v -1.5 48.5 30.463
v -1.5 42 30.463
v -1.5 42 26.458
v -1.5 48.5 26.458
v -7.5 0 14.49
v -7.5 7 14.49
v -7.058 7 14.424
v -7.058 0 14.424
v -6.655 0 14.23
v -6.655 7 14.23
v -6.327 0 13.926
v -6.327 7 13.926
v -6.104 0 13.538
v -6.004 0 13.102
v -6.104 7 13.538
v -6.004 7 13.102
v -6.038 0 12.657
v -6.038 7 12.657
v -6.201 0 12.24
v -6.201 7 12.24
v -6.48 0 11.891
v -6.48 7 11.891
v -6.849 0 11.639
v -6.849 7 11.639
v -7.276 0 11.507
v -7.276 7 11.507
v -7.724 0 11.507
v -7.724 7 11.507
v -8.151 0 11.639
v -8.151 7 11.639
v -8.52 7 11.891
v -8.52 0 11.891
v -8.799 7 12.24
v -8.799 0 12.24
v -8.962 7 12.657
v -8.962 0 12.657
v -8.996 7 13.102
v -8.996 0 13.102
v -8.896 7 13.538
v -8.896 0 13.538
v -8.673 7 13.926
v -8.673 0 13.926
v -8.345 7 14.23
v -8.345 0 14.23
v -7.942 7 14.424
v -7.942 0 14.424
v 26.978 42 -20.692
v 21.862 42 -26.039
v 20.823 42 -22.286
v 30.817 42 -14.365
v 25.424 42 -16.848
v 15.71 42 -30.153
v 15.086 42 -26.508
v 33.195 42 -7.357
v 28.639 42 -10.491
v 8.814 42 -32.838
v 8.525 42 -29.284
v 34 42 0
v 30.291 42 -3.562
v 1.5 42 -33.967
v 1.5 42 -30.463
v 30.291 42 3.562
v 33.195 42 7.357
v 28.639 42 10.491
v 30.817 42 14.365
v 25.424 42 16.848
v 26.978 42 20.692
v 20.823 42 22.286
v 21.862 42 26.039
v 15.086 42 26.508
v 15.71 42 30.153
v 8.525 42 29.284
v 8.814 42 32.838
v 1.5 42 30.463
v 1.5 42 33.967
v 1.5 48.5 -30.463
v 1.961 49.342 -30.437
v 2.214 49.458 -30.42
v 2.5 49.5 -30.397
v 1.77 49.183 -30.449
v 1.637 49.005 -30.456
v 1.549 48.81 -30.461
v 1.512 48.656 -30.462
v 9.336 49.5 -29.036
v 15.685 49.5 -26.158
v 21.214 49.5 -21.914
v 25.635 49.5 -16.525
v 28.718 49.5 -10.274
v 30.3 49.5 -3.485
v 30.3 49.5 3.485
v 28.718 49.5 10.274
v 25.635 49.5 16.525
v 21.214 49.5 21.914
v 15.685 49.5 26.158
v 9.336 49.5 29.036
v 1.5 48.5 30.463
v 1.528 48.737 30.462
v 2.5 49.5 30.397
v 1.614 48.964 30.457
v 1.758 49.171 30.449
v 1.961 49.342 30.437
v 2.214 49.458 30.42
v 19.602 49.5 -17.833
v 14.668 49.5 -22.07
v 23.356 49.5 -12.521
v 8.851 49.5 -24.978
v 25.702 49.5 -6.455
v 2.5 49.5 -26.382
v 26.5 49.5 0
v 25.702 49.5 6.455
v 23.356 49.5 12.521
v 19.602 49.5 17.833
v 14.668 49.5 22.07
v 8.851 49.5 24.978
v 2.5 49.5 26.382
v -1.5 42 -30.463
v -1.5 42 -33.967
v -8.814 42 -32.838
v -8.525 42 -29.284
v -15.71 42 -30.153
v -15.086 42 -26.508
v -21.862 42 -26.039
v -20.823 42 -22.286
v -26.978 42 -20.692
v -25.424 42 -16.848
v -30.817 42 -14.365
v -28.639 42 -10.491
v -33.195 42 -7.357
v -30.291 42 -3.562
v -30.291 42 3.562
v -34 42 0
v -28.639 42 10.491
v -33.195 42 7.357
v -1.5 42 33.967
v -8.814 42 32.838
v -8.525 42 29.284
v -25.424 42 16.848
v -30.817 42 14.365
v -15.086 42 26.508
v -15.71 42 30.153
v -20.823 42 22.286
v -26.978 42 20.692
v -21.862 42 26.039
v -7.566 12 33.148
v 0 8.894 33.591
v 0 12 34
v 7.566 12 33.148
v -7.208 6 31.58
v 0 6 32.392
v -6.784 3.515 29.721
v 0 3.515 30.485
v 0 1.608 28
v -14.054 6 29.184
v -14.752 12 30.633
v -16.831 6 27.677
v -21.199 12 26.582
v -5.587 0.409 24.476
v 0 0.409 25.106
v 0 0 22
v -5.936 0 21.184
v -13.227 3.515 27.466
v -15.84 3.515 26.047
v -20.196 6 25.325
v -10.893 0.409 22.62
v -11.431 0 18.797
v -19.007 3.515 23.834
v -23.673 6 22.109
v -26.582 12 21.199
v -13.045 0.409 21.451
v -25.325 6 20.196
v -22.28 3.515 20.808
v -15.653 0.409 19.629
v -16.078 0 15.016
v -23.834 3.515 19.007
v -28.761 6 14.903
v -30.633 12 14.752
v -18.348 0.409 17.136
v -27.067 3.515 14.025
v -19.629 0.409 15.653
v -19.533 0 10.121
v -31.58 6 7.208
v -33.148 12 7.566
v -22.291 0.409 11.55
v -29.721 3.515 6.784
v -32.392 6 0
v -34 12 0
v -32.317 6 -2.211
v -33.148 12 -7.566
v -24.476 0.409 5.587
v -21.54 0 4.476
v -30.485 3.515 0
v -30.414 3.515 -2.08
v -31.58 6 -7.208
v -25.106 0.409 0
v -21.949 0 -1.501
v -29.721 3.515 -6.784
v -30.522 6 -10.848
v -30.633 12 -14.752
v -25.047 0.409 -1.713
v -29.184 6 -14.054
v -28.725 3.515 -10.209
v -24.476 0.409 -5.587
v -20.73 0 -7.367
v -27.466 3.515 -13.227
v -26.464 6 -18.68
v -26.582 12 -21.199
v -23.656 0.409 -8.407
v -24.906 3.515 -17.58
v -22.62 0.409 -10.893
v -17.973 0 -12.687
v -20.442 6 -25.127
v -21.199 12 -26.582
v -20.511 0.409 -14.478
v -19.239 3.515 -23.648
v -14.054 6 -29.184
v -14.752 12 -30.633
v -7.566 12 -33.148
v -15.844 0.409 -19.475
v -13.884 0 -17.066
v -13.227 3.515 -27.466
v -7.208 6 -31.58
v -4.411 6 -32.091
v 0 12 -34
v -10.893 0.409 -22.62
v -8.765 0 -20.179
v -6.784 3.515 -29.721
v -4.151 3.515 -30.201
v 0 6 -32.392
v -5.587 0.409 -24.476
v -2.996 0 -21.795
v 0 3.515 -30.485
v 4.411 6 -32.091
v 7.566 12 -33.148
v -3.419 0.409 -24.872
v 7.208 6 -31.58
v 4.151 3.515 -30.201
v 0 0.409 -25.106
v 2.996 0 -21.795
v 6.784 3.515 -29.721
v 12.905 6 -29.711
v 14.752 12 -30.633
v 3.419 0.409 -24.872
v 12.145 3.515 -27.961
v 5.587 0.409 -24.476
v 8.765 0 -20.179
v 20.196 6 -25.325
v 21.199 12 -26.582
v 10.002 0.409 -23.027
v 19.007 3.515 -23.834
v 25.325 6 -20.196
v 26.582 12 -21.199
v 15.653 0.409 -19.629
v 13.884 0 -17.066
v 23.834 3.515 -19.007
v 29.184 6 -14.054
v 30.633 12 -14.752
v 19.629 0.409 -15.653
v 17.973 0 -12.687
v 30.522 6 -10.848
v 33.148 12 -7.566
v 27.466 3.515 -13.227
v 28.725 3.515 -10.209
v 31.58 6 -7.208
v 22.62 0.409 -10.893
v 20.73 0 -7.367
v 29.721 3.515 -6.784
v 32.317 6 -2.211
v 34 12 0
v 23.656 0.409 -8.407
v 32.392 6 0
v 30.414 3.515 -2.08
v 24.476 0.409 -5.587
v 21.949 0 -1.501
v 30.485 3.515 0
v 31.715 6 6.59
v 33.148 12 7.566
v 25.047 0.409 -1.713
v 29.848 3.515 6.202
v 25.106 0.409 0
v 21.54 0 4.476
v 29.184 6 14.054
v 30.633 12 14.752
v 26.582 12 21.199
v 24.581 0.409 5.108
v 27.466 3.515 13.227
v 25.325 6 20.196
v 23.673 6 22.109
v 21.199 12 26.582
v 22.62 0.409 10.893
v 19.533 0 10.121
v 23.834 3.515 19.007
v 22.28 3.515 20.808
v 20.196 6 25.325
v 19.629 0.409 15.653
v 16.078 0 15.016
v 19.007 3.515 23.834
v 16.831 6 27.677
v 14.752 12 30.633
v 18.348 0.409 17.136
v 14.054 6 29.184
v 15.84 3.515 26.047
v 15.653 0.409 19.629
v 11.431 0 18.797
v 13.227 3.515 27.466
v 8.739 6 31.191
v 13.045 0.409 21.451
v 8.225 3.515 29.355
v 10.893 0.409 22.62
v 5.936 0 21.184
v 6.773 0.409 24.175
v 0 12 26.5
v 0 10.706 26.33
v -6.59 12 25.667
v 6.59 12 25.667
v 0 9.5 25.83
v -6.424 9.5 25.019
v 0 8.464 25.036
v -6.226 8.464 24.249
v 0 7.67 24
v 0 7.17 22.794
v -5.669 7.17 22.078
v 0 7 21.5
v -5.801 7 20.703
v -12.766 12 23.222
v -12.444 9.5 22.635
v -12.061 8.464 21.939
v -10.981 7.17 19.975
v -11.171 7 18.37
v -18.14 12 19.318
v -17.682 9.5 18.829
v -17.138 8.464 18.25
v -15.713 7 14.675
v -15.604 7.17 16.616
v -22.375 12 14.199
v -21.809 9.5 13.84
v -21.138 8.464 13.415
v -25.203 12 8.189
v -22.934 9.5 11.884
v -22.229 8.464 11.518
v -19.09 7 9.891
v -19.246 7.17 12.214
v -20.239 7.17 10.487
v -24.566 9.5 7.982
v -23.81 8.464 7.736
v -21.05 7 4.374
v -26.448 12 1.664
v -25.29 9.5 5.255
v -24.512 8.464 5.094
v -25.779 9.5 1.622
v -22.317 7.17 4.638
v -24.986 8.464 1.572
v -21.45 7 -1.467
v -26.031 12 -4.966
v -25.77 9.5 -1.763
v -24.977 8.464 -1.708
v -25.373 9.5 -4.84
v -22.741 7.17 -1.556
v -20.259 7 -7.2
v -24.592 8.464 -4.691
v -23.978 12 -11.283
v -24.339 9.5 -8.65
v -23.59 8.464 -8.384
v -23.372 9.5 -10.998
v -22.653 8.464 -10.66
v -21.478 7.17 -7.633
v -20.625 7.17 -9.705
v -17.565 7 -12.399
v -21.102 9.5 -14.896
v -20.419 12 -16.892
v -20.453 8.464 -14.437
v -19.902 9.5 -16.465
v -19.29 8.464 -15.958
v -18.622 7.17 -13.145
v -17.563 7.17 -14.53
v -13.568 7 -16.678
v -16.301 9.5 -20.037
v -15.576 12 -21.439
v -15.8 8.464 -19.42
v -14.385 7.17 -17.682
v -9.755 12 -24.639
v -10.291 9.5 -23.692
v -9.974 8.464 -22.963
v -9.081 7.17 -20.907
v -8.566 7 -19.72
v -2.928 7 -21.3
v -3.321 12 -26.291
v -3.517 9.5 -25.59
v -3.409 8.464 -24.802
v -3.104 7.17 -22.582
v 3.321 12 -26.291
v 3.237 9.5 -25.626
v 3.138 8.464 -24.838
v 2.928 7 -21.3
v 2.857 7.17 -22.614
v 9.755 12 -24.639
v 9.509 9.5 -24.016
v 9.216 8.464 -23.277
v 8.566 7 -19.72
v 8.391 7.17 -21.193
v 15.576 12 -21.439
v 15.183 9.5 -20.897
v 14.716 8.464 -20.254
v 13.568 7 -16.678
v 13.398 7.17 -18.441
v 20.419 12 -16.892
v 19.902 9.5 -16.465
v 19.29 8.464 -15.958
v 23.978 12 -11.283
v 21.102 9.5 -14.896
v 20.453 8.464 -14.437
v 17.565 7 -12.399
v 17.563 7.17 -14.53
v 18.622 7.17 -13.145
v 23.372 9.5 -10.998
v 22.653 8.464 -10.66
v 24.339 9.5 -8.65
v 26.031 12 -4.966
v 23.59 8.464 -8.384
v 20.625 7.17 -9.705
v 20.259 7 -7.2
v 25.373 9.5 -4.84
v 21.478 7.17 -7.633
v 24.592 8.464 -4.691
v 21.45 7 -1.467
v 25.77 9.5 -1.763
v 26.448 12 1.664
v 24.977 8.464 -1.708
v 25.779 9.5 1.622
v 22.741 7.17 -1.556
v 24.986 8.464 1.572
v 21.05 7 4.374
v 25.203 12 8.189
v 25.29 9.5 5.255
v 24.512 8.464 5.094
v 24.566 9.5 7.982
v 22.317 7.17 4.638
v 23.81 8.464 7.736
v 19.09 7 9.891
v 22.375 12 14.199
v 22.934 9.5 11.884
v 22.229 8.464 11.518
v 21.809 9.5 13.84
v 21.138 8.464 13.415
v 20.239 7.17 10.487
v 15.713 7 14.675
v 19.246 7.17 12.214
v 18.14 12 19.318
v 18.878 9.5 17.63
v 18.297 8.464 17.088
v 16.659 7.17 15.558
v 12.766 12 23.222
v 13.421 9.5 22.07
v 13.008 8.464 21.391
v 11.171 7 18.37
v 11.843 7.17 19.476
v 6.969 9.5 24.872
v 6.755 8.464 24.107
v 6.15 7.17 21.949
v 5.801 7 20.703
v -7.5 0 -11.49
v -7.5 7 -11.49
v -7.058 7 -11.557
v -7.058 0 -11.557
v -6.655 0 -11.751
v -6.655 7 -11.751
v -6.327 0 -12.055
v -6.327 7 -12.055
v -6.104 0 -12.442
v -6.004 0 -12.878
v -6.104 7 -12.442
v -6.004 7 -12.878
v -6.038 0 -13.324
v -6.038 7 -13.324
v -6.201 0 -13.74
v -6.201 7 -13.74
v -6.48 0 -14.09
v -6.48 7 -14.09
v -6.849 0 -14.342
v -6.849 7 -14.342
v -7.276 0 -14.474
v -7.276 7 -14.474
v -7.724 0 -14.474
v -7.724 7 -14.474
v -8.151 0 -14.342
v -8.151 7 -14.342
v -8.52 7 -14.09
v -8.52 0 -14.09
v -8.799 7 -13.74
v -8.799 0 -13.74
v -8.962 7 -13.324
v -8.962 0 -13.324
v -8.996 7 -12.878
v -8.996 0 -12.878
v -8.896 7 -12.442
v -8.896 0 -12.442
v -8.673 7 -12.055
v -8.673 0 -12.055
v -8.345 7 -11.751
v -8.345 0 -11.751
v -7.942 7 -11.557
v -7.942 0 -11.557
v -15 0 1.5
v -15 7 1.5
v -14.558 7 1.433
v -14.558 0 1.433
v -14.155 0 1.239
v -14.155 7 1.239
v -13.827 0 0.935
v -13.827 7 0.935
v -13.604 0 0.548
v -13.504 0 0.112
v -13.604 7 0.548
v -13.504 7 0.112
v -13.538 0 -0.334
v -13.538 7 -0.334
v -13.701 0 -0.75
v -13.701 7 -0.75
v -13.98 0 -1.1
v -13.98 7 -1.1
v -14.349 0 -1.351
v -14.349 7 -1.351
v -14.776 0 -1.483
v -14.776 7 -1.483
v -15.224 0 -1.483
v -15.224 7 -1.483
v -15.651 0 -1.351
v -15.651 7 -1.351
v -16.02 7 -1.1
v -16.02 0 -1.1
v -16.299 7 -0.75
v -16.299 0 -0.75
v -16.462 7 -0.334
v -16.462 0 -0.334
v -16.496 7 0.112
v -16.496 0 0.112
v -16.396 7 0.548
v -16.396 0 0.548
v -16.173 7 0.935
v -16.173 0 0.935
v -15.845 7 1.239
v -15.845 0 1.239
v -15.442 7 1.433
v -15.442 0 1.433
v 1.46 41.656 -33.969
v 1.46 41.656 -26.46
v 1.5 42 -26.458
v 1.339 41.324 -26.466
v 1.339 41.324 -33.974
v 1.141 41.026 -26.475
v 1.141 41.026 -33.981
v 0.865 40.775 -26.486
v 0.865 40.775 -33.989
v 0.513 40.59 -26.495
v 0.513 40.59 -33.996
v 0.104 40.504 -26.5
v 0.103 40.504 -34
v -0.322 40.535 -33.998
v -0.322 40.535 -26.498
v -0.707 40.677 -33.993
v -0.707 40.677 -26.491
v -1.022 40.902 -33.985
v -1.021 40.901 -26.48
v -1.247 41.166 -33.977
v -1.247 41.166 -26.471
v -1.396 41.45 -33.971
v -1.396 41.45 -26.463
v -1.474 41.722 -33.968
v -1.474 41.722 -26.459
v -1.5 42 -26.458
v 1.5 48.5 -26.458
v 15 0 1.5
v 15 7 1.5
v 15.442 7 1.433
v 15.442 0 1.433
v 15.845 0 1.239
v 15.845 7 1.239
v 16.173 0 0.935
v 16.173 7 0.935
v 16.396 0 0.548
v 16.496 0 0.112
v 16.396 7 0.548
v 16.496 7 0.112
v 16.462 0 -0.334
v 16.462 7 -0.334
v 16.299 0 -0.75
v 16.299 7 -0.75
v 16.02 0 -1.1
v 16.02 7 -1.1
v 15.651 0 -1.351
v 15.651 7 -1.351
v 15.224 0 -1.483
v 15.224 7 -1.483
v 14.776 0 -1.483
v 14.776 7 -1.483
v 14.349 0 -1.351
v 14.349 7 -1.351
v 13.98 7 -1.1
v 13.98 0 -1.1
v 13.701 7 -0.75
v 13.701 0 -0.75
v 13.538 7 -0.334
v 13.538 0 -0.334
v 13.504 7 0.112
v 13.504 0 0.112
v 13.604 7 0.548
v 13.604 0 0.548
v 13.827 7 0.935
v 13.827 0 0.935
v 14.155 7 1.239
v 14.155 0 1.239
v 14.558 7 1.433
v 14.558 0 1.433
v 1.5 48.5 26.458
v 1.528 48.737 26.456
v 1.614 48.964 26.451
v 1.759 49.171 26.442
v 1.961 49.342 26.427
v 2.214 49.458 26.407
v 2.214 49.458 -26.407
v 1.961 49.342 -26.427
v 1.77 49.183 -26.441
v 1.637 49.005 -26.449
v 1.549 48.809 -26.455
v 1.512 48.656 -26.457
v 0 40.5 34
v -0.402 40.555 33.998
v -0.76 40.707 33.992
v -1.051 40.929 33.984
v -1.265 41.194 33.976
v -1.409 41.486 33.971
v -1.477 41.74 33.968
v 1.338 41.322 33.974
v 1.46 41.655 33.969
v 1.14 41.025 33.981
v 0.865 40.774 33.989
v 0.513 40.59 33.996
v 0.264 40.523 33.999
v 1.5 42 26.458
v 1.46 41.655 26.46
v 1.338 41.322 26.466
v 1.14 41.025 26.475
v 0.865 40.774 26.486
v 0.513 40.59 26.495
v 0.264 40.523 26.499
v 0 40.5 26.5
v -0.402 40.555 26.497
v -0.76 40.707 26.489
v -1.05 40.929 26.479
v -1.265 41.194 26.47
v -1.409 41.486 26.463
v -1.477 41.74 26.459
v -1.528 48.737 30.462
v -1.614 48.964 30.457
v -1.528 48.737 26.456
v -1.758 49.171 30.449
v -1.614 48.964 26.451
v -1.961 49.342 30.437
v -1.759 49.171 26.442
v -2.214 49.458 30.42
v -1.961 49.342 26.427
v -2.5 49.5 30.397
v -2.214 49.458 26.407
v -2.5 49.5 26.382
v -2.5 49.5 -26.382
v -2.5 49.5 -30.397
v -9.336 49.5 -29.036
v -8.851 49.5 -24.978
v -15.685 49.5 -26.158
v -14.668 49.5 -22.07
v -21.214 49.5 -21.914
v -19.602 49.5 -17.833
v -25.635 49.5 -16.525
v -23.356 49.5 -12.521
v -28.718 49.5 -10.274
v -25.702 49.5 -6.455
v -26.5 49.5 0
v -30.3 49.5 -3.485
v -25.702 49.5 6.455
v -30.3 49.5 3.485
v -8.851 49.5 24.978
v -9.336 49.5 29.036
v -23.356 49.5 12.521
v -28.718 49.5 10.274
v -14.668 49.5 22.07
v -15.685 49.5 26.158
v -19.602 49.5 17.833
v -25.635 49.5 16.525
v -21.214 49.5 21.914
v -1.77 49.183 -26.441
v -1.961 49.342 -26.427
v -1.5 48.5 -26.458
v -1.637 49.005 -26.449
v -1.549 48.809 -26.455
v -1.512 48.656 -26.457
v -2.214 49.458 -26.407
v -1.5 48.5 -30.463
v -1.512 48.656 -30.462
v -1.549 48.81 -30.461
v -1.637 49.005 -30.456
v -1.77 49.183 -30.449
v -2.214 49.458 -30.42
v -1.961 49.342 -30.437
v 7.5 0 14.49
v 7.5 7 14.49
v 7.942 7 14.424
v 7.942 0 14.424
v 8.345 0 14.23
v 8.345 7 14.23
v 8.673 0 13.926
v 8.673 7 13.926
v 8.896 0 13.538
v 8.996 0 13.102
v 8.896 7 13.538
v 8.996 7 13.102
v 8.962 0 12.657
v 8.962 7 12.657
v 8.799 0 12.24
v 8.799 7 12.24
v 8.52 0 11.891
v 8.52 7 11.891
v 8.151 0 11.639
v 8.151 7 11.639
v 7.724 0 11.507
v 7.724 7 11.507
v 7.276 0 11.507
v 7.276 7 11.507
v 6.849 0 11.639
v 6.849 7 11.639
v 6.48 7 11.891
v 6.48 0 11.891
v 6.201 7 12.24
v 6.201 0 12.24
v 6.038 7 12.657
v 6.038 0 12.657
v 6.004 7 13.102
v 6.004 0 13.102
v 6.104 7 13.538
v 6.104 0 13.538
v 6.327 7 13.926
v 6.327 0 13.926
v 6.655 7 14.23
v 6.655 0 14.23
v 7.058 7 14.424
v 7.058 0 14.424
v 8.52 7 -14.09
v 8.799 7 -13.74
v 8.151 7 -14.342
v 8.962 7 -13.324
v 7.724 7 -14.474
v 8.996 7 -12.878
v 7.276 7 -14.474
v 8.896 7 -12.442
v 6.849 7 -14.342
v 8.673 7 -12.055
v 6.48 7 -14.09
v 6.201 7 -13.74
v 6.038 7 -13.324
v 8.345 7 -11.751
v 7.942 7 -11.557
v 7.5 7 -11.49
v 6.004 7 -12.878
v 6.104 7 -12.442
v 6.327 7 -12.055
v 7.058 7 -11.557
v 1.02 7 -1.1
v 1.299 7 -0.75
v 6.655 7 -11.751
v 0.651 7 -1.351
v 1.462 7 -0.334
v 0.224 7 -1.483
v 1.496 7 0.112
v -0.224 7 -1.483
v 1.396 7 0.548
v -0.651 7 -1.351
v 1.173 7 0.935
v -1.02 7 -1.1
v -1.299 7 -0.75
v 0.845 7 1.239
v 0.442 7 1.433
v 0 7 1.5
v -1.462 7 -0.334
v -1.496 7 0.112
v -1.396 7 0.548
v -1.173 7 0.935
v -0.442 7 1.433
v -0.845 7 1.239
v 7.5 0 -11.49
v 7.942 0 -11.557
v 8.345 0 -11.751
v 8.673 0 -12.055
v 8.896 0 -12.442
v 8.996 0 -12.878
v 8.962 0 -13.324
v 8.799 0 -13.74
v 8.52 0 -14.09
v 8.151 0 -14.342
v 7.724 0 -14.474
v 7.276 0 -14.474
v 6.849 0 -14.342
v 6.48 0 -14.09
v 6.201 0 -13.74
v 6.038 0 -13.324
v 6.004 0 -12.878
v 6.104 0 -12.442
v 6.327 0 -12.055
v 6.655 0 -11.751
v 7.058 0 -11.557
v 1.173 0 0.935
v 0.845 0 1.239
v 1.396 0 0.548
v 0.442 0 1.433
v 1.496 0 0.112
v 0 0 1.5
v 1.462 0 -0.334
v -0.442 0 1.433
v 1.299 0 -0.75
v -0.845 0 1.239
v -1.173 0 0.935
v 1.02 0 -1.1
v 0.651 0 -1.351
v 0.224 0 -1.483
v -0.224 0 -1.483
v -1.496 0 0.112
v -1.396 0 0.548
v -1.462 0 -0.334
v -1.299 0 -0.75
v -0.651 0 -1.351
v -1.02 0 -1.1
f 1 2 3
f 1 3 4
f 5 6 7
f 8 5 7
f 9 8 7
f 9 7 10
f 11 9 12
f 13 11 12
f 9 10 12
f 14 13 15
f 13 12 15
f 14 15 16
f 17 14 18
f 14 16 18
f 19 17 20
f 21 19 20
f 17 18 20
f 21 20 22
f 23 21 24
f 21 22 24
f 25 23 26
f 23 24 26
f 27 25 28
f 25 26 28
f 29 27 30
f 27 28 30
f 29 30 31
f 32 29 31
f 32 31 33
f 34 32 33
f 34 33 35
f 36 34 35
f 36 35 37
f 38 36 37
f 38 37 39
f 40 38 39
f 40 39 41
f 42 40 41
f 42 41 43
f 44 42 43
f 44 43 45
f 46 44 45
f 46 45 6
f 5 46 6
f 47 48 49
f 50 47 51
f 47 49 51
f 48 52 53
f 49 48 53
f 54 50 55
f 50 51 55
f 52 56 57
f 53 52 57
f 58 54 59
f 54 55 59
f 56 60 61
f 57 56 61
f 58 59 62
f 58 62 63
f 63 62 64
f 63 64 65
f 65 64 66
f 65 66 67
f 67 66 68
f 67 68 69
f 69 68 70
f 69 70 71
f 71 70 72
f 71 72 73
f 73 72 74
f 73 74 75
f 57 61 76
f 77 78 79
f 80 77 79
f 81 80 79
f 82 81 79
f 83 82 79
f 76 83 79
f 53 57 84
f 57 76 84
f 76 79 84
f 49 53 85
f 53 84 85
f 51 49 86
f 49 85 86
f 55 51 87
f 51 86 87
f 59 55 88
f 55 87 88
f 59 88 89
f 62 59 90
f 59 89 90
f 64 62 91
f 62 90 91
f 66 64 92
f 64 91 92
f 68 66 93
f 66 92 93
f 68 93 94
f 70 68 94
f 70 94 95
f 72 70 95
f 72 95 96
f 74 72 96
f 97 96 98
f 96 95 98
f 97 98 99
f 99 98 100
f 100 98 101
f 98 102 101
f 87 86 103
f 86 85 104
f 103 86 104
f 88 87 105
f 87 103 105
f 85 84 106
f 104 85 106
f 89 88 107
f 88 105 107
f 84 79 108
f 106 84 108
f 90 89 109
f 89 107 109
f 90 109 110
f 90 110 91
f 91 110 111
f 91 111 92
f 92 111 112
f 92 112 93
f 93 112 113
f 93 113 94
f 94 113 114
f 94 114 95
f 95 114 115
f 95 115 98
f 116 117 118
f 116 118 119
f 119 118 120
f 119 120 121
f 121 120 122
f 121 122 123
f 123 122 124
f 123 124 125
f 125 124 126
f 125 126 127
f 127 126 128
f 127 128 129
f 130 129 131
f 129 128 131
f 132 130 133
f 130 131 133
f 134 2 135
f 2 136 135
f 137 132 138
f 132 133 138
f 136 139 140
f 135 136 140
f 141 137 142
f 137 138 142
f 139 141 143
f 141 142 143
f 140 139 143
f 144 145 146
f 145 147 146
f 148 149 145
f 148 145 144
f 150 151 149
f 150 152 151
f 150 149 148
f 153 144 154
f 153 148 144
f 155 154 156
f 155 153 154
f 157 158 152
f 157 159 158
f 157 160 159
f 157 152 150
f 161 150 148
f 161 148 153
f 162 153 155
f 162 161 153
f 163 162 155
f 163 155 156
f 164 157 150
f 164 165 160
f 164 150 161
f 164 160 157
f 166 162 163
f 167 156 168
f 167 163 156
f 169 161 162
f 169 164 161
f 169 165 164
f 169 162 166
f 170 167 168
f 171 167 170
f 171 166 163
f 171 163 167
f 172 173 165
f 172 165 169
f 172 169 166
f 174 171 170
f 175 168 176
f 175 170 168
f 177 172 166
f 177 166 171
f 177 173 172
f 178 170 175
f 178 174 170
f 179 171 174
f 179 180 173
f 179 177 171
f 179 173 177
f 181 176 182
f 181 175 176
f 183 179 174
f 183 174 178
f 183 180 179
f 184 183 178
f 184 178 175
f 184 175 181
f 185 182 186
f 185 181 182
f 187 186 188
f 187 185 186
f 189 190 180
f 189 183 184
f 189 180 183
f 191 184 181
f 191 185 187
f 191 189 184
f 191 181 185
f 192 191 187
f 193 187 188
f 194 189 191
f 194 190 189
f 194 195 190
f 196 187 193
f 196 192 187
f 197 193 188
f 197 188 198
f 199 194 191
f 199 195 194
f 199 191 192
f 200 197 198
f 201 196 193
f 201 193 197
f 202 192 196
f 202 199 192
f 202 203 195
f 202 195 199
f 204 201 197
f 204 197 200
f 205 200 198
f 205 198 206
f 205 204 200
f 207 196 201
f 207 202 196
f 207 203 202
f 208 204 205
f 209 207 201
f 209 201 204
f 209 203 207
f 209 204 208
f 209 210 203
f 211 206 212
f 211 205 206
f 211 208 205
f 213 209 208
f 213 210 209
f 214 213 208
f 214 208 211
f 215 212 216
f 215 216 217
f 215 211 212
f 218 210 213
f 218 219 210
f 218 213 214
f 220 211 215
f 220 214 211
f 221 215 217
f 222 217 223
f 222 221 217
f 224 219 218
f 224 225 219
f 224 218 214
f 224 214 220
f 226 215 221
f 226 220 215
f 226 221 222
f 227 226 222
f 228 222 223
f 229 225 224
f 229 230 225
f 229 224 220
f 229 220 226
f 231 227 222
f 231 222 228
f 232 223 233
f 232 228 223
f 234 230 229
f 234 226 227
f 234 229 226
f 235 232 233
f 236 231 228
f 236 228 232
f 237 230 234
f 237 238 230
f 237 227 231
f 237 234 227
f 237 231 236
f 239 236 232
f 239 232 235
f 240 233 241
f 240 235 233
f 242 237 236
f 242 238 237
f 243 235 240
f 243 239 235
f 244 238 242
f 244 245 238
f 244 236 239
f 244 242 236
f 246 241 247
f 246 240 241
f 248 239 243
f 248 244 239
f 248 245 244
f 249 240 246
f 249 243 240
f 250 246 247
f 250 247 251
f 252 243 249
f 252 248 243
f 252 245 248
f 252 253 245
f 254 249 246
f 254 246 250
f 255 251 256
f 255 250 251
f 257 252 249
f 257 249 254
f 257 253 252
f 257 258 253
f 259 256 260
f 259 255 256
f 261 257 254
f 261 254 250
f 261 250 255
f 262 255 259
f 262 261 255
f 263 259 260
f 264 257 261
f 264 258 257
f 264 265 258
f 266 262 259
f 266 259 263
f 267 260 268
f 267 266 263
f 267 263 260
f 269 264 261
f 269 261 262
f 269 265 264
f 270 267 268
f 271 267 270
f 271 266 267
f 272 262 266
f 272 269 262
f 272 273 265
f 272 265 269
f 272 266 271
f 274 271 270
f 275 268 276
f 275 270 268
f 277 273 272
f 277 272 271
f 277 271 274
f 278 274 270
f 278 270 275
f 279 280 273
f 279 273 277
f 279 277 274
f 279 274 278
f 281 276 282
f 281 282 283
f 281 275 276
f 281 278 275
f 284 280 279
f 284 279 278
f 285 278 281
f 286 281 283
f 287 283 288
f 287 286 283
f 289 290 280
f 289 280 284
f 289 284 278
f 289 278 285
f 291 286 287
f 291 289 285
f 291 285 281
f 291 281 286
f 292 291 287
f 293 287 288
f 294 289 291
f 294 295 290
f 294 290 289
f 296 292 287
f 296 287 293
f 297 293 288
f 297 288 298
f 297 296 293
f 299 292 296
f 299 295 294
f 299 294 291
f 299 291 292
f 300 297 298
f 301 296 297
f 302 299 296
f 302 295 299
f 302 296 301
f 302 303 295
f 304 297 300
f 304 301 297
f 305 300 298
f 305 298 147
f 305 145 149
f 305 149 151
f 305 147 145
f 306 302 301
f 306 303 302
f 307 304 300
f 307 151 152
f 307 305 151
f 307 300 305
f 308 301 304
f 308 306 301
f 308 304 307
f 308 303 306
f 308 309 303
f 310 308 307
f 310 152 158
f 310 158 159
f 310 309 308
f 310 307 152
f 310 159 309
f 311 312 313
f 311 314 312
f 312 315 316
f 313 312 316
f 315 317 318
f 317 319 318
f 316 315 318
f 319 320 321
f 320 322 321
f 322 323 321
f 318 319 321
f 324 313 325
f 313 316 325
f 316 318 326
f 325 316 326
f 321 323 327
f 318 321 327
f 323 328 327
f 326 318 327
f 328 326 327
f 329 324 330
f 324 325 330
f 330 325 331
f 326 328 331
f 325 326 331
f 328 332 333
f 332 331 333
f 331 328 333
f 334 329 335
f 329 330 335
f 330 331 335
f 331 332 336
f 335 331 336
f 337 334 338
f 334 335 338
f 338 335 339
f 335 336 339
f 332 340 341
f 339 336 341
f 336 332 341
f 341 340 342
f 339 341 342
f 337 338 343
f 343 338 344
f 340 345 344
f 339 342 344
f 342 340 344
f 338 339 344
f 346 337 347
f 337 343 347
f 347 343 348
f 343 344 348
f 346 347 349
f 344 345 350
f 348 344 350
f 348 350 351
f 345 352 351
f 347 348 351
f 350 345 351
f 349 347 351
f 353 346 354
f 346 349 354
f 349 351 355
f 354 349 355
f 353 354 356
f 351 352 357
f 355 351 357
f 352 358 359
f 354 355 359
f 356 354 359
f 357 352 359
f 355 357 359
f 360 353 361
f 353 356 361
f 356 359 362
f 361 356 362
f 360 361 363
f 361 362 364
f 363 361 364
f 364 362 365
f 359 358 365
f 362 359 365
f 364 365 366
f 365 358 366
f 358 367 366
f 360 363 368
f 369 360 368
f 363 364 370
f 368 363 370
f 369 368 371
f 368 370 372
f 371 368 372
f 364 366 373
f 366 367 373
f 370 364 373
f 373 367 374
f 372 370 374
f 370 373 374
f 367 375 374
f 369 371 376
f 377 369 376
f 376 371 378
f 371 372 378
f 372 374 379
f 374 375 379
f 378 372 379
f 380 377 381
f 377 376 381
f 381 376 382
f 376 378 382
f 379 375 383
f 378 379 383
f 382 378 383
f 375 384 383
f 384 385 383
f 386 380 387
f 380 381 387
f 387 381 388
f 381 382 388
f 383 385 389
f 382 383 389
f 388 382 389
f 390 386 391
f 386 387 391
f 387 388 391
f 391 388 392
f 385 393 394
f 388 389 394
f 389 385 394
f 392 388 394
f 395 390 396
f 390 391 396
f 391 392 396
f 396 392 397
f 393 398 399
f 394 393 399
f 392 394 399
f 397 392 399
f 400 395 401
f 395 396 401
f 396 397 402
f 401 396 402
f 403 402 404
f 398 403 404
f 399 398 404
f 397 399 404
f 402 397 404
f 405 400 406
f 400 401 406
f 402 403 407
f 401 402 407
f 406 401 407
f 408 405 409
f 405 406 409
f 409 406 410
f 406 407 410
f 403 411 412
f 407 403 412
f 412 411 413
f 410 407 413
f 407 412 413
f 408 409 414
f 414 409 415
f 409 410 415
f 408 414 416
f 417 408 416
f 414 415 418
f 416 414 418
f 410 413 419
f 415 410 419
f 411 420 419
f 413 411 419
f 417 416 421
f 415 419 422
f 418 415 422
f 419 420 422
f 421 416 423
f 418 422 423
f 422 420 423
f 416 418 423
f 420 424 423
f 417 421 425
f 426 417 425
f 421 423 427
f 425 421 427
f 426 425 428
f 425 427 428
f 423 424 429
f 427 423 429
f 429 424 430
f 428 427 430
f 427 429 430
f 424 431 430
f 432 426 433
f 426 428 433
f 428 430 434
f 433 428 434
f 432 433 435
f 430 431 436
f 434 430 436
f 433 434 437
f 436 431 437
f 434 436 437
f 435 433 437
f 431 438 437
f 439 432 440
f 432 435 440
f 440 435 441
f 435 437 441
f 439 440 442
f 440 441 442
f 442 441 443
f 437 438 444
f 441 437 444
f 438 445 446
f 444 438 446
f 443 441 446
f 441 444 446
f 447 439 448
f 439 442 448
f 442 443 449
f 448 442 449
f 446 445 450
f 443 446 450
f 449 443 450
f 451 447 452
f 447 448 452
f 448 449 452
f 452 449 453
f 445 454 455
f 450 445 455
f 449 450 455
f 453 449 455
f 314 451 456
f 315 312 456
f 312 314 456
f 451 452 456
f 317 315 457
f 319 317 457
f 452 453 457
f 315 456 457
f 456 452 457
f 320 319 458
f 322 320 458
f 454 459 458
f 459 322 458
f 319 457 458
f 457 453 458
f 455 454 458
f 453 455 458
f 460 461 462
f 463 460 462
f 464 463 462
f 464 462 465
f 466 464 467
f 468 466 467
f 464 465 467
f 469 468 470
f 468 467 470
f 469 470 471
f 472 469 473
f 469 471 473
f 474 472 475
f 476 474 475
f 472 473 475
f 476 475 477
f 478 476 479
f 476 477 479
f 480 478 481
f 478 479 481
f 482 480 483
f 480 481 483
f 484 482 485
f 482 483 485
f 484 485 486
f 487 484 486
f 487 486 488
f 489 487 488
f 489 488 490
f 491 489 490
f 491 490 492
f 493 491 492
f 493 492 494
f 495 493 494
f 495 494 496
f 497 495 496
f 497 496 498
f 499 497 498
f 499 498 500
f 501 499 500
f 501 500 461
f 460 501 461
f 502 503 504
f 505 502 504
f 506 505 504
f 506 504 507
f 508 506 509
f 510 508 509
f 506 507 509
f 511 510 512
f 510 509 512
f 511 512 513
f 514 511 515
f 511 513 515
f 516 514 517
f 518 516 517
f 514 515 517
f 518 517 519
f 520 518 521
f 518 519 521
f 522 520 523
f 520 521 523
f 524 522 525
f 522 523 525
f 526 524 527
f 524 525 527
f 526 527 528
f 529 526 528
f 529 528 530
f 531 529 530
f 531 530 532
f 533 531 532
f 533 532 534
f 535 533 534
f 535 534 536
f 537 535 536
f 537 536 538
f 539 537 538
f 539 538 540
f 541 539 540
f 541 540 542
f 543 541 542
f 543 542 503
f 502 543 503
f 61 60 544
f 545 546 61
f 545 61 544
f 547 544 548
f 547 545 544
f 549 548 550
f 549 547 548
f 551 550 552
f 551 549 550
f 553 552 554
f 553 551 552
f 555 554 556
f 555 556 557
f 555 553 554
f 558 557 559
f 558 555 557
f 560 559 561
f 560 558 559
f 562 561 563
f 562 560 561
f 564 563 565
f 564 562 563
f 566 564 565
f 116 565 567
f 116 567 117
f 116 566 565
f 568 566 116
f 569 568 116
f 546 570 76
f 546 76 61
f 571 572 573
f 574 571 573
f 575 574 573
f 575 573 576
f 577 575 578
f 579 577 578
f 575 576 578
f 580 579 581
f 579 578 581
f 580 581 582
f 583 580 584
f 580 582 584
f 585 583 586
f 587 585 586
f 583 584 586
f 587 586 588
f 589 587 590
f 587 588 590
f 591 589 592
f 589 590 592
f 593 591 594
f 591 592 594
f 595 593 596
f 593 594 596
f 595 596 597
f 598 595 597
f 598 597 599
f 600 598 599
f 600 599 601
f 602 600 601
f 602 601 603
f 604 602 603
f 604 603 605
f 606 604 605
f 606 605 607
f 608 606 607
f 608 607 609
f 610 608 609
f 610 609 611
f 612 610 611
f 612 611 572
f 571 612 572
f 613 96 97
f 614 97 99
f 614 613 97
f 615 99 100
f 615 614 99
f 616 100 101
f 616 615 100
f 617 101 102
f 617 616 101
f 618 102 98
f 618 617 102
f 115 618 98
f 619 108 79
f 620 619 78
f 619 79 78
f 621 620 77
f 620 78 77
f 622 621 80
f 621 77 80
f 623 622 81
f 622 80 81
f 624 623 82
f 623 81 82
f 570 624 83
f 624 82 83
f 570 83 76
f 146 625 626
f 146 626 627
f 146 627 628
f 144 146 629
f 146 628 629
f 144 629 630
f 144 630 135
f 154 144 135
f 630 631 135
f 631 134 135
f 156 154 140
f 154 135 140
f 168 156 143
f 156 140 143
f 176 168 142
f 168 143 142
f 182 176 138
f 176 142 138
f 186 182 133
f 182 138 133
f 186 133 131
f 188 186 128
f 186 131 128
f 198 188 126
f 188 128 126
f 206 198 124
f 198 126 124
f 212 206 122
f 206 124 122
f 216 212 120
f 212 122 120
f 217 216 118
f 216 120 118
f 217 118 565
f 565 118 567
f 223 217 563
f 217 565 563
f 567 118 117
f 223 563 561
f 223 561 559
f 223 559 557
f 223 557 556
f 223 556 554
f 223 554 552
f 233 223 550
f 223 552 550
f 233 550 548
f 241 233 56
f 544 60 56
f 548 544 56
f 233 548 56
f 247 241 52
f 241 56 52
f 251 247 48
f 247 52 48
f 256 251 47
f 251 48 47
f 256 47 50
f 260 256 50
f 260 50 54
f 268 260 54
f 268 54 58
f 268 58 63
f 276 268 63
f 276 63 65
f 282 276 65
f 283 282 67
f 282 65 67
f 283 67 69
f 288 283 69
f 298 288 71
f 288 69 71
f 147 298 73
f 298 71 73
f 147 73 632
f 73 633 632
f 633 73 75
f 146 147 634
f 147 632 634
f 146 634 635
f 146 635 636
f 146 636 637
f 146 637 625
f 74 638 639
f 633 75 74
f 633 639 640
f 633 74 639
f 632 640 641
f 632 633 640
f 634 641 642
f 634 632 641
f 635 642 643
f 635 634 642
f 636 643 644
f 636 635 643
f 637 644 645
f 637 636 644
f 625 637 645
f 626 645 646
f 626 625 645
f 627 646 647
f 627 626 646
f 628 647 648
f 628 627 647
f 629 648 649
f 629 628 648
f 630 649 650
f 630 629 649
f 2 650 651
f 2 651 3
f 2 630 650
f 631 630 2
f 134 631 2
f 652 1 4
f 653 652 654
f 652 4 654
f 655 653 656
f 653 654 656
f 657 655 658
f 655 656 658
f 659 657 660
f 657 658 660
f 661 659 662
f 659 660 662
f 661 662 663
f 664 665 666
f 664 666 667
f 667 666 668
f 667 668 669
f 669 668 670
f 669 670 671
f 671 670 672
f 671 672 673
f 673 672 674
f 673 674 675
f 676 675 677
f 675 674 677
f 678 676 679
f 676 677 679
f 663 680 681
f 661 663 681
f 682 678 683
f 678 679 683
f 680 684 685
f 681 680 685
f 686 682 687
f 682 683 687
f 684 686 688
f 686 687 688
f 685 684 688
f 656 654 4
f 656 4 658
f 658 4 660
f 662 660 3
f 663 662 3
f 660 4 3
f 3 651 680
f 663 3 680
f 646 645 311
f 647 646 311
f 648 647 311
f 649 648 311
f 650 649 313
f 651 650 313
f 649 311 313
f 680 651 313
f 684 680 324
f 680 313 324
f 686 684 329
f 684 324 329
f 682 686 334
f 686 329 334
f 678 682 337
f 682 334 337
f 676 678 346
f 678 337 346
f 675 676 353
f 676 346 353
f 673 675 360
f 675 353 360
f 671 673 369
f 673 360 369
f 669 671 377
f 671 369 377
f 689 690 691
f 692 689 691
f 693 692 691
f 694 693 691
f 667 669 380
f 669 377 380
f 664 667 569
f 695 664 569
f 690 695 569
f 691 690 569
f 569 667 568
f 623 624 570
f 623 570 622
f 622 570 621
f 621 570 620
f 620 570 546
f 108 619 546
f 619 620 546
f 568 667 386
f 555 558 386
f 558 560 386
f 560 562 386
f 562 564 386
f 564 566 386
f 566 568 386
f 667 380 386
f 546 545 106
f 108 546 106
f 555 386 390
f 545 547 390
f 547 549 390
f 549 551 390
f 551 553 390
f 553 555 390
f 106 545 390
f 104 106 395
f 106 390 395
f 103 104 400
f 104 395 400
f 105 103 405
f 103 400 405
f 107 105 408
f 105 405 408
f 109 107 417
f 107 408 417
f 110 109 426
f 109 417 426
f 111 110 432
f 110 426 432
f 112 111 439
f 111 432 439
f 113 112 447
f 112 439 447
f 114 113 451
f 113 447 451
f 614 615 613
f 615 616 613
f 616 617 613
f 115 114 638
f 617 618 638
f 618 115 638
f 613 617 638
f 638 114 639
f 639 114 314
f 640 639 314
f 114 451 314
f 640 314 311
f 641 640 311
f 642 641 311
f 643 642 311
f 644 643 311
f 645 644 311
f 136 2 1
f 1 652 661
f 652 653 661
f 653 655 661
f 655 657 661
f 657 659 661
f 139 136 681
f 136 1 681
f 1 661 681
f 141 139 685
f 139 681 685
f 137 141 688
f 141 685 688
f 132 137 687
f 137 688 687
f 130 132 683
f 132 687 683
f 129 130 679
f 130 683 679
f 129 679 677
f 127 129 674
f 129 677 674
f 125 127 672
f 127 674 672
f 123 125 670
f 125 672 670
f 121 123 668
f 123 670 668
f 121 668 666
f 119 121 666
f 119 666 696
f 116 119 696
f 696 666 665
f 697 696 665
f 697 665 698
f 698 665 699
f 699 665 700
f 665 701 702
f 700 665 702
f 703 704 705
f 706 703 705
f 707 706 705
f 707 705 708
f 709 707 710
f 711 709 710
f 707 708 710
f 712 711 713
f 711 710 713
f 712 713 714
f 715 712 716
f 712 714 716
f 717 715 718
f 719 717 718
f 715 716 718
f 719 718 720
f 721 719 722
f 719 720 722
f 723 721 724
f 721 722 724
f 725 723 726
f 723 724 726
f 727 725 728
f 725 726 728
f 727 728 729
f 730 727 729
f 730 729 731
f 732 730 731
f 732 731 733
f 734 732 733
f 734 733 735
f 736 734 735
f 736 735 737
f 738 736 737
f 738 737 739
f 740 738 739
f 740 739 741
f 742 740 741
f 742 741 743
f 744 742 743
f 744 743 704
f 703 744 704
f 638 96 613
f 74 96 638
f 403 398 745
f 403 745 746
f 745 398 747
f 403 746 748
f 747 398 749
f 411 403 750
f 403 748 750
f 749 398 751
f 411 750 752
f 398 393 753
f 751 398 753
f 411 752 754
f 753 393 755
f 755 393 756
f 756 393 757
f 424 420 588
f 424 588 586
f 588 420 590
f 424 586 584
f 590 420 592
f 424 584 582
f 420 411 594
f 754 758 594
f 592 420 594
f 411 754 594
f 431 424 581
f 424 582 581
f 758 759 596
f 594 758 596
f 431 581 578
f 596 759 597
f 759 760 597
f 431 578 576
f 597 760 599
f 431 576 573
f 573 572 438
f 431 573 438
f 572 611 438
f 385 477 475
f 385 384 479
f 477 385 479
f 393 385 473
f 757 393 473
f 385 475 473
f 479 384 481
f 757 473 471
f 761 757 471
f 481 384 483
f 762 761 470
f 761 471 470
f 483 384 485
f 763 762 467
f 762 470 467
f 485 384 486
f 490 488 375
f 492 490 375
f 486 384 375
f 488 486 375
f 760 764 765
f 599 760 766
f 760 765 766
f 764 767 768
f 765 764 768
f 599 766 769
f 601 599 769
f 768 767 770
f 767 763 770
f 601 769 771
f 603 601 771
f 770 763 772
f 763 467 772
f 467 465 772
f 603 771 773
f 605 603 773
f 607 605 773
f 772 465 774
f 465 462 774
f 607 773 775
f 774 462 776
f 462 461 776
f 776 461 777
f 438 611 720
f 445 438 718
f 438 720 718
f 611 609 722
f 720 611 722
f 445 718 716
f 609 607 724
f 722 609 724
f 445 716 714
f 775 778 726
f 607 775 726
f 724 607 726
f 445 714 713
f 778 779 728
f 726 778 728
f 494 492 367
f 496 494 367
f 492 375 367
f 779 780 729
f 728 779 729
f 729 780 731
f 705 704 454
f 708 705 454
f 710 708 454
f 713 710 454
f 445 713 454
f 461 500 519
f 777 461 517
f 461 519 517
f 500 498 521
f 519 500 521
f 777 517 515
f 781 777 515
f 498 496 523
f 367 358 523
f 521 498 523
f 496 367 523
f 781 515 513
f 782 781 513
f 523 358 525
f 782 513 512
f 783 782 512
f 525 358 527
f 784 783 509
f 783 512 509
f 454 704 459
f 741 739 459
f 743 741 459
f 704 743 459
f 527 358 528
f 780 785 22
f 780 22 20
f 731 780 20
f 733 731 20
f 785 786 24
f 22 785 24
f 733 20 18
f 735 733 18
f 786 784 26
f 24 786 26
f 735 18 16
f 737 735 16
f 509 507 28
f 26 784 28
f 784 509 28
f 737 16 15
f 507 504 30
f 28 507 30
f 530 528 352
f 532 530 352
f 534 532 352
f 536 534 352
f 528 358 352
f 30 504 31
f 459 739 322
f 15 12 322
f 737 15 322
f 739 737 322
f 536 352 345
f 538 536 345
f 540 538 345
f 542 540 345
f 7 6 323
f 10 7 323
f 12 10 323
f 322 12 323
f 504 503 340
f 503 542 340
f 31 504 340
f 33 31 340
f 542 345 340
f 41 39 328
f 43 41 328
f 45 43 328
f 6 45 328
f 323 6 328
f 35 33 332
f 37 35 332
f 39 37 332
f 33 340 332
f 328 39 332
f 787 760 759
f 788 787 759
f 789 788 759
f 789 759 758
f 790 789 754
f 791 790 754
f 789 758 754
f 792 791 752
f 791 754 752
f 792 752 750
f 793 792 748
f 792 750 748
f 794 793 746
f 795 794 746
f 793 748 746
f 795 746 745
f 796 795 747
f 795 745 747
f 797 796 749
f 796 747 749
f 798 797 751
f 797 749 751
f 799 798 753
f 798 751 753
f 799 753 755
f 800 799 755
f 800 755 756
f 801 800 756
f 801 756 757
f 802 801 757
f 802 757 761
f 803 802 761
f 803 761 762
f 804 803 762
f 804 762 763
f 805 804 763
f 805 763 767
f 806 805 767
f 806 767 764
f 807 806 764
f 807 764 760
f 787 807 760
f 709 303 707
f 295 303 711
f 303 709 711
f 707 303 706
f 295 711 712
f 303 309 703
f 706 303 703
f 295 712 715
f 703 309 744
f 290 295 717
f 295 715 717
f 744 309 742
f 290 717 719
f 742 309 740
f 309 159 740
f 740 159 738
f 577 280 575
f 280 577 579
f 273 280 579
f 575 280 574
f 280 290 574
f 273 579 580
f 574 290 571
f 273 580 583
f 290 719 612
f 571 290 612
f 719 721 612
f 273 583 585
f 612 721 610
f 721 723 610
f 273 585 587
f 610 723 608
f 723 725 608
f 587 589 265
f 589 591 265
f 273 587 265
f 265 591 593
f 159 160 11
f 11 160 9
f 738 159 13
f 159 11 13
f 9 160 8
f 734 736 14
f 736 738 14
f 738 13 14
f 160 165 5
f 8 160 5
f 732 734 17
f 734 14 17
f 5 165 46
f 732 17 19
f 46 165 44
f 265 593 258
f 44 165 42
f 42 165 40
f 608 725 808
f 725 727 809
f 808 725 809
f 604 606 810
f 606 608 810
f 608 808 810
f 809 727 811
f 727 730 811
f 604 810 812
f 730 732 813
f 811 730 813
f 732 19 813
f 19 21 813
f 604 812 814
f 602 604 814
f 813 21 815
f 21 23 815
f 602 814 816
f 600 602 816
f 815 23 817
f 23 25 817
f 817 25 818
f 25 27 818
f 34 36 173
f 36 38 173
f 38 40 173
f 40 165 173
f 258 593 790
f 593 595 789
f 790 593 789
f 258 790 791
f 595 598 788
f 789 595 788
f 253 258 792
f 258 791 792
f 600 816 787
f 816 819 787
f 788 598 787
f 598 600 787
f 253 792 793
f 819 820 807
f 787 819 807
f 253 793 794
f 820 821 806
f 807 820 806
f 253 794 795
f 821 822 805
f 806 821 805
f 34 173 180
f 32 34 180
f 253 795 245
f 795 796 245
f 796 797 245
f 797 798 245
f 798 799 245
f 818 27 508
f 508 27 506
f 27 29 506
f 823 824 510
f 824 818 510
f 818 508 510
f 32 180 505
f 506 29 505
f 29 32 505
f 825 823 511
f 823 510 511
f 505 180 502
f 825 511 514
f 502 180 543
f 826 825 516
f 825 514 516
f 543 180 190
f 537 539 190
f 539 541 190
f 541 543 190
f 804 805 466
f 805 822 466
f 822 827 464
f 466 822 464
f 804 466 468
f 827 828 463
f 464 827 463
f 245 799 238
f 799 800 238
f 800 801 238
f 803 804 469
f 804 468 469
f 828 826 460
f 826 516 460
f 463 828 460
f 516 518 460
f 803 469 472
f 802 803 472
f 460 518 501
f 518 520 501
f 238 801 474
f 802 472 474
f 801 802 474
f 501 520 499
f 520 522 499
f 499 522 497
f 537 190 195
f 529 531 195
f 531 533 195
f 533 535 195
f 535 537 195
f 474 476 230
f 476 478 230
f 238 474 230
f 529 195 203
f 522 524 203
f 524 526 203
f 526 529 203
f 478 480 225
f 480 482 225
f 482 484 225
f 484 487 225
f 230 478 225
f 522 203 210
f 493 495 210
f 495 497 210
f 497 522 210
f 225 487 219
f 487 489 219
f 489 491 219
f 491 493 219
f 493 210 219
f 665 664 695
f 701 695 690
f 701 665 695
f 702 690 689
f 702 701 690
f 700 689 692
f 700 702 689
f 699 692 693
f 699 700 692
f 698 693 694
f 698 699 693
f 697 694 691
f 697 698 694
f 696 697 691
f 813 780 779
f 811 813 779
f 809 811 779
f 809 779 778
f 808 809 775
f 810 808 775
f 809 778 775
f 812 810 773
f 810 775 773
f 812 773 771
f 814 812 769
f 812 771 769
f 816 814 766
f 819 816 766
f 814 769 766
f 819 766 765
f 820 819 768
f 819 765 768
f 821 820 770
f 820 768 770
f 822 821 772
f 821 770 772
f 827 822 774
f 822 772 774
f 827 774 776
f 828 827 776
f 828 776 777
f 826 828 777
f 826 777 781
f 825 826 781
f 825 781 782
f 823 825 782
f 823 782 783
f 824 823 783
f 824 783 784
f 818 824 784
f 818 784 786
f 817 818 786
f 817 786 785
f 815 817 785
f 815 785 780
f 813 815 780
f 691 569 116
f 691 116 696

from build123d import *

# Parameters (mm, degrees)
ENL_V_MAT_EXTRU_1_REACH = 66.174
ESQUISSE2_R             = 1.5
ENL_V_MAT_EXTRU_2_DEPTH = 91.720725306
CONG_1_R                = 12
CONG_2_R                = 5
CONG_3_R                = 1


with BuildPart() as part:
    # Esquisse1 → Révolution1 (revolve)
    with BuildSketch(Plane(origin=(0, 0, 0), x_dir=(0, 0, -1), z_dir=(1, 0, 0)), mode=Mode.PRIVATE) as r_volution1_sk:
        Polygon((26.5, 49.5), (26.5, 7), (0, 7), (0, 0), (34, 0), (34, 42), (30.5, 42), (30.5, 49.5), align=None)
    revolve(r_volution1_sk.sketch.rotate(Axis((0, 7, 0), (0, -1, 0)), 180), axis=Axis((0, 7, 0), (0, -1, 0)))

    # Esquisse2 → Enlèv. mat.-Extru.1 (cut, up to next)
    with BuildSketch(Plane(origin=(0, 7, 0), x_dir=(1, 0, 0), z_dir=(0, 1, 0)), mode=Mode.PRIVATE) as enl_v_mat_extru_1_sk1:
        with Locations(Location((0, 0, 0), (0, 0, 270))):
            Circle(ESQUISSE2_R)
    enl_v_mat_extru_1_tool1 = extrude(enl_v_mat_extru_1_sk1.sketch, amount=-ENL_V_MAT_EXTRU_1_REACH, mode=Mode.PRIVATE) & part.part
    # Esquisse2 → Enlèv. mat.-Extru.1 (cut, up to next)
    with BuildSketch(Plane(origin=(0, 7, 0), x_dir=(1, 0, 0), z_dir=(0, 1, 0)), mode=Mode.PRIVATE) as enl_v_mat_extru_1_sk2:
        with Locations(Location((15, 0, 0), (0, 0, 270))):
            Circle(ESQUISSE2_R)
    enl_v_mat_extru_1_tool2 = extrude(enl_v_mat_extru_1_sk2.sketch, amount=-ENL_V_MAT_EXTRU_1_REACH, mode=Mode.PRIVATE) & part.part
    # Esquisse2 → Enlèv. mat.-Extru.1 (cut, up to next)
    with BuildSketch(Plane(origin=(0, 7, 0), x_dir=(1, 0, 0), z_dir=(0, 1, 0)), mode=Mode.PRIVATE) as enl_v_mat_extru_1_sk3:
        with Locations(Location((7.5, -12.990381057, 0), (0, 0, 270))):
            Circle(ESQUISSE2_R)
    enl_v_mat_extru_1_tool3 = extrude(enl_v_mat_extru_1_sk3.sketch, amount=-ENL_V_MAT_EXTRU_1_REACH, mode=Mode.PRIVATE) & part.part
    # Esquisse2 → Enlèv. mat.-Extru.1 (cut, up to next)
    with BuildSketch(Plane(origin=(0, 7, 0), x_dir=(1, 0, 0), z_dir=(0, 1, 0)), mode=Mode.PRIVATE) as enl_v_mat_extru_1_sk4:
        with Locations(Location((-7.5, -12.990381057, 0), (0, 0, 270))):
            Circle(ESQUISSE2_R)
    enl_v_mat_extru_1_tool4 = extrude(enl_v_mat_extru_1_sk4.sketch, amount=-ENL_V_MAT_EXTRU_1_REACH, mode=Mode.PRIVATE) & part.part
    # Esquisse2 → Enlèv. mat.-Extru.1 (cut, up to next)
    with BuildSketch(Plane(origin=(0, 7, 0), x_dir=(1, 0, 0), z_dir=(0, 1, 0)), mode=Mode.PRIVATE) as enl_v_mat_extru_1_sk5:
        with Locations(Location((-15, 0, 0), (0, 0, 270))):
            Circle(ESQUISSE2_R)
    enl_v_mat_extru_1_tool5 = extrude(enl_v_mat_extru_1_sk5.sketch, amount=-ENL_V_MAT_EXTRU_1_REACH, mode=Mode.PRIVATE) & part.part
    # Esquisse2 → Enlèv. mat.-Extru.1 (cut, up to next)
    with BuildSketch(Plane(origin=(0, 7, 0), x_dir=(1, 0, 0), z_dir=(0, 1, 0)), mode=Mode.PRIVATE) as enl_v_mat_extru_1_sk6:
        with Locations(Location((-7.5, 12.990381057, 0), (0, 0, 270))):
            Circle(ESQUISSE2_R)
    enl_v_mat_extru_1_tool6 = extrude(enl_v_mat_extru_1_sk6.sketch, amount=-ENL_V_MAT_EXTRU_1_REACH, mode=Mode.PRIVATE) & part.part
    # Esquisse2 → Enlèv. mat.-Extru.1 (cut, up to next)
    with BuildSketch(Plane(origin=(0, 7, 0), x_dir=(1, 0, 0), z_dir=(0, 1, 0)), mode=Mode.PRIVATE) as enl_v_mat_extru_1_sk7:
        with Locations(Location((7.5, 12.990381057, 0), (0, 0, 270))):
            Circle(ESQUISSE2_R)
    enl_v_mat_extru_1_tool7 = extrude(enl_v_mat_extru_1_sk7.sketch, amount=-ENL_V_MAT_EXTRU_1_REACH, mode=Mode.PRIVATE) & part.part
    add(enl_v_mat_extru_1_tool1.solids().sort_by_distance((0, 7, 0))[0], mode=Mode.SUBTRACT)
    add(enl_v_mat_extru_1_tool2.solids().sort_by_distance((15, 7, 0))[0], mode=Mode.SUBTRACT)
    add(enl_v_mat_extru_1_tool3.solids().sort_by_distance((7.5, 7, 12.990381))[0], mode=Mode.SUBTRACT)
    add(enl_v_mat_extru_1_tool4.solids().sort_by_distance((-7.5, 7, 12.990381))[0], mode=Mode.SUBTRACT)
    add(enl_v_mat_extru_1_tool5.solids().sort_by_distance((-15, 7, 0))[0], mode=Mode.SUBTRACT)
    add(enl_v_mat_extru_1_tool6.solids().sort_by_distance((-7.5, 7, -12.990381))[0], mode=Mode.SUBTRACT)
    add(enl_v_mat_extru_1_tool7.solids().sort_by_distance((7.5, 7, -12.990381))[0], mode=Mode.SUBTRACT)

    # Esquisse3 → Enlèv. mat.-Extru.2 (cut, through all)
    with BuildSketch(Plane.XY.offset(34)):
        with BuildLine():
            Line((-1.5, 42), (-1.5, 49.5))
            Line((-1.5, 49.5), (1.5, 49.5))
            Line((1.5, 49.5), (1.5, 42))
            ThreePointArc((1.5, 42), (0, 40.5), (-1.5, 42))
        make_face()
    extrude(amount=-ENL_V_MAT_EXTRU_2_DEPTH, mode=Mode.SUBTRACT)

    # Congé1
    cong_1_edges = [part.edges().sort_by_distance(p)[0] for p in [
        (0, 0, -34),
    ]]
    fillet(cong_1_edges, radius=CONG_1_R)

    # Congé2
    cong_2_edges = [part.edges().sort_by_distance(p)[0] for p in [
        (0, 7, -26.5),
    ]]
    fillet(cong_2_edges, radius=CONG_2_R)

    # Congé3
    cong_3_edges = [part.edges().sort_by_distance(p)[0] for p in [
        (-1.5, 49.5, -28.460302767),
        (-1.5, 49.5, 28.460302767),
        (1.5, 49.5, -28.460302767),
        (1.5, 49.5, 28.460302767),
    ]]
    fillet(cong_3_edges, radius=CONG_3_R)


solid = part.part
